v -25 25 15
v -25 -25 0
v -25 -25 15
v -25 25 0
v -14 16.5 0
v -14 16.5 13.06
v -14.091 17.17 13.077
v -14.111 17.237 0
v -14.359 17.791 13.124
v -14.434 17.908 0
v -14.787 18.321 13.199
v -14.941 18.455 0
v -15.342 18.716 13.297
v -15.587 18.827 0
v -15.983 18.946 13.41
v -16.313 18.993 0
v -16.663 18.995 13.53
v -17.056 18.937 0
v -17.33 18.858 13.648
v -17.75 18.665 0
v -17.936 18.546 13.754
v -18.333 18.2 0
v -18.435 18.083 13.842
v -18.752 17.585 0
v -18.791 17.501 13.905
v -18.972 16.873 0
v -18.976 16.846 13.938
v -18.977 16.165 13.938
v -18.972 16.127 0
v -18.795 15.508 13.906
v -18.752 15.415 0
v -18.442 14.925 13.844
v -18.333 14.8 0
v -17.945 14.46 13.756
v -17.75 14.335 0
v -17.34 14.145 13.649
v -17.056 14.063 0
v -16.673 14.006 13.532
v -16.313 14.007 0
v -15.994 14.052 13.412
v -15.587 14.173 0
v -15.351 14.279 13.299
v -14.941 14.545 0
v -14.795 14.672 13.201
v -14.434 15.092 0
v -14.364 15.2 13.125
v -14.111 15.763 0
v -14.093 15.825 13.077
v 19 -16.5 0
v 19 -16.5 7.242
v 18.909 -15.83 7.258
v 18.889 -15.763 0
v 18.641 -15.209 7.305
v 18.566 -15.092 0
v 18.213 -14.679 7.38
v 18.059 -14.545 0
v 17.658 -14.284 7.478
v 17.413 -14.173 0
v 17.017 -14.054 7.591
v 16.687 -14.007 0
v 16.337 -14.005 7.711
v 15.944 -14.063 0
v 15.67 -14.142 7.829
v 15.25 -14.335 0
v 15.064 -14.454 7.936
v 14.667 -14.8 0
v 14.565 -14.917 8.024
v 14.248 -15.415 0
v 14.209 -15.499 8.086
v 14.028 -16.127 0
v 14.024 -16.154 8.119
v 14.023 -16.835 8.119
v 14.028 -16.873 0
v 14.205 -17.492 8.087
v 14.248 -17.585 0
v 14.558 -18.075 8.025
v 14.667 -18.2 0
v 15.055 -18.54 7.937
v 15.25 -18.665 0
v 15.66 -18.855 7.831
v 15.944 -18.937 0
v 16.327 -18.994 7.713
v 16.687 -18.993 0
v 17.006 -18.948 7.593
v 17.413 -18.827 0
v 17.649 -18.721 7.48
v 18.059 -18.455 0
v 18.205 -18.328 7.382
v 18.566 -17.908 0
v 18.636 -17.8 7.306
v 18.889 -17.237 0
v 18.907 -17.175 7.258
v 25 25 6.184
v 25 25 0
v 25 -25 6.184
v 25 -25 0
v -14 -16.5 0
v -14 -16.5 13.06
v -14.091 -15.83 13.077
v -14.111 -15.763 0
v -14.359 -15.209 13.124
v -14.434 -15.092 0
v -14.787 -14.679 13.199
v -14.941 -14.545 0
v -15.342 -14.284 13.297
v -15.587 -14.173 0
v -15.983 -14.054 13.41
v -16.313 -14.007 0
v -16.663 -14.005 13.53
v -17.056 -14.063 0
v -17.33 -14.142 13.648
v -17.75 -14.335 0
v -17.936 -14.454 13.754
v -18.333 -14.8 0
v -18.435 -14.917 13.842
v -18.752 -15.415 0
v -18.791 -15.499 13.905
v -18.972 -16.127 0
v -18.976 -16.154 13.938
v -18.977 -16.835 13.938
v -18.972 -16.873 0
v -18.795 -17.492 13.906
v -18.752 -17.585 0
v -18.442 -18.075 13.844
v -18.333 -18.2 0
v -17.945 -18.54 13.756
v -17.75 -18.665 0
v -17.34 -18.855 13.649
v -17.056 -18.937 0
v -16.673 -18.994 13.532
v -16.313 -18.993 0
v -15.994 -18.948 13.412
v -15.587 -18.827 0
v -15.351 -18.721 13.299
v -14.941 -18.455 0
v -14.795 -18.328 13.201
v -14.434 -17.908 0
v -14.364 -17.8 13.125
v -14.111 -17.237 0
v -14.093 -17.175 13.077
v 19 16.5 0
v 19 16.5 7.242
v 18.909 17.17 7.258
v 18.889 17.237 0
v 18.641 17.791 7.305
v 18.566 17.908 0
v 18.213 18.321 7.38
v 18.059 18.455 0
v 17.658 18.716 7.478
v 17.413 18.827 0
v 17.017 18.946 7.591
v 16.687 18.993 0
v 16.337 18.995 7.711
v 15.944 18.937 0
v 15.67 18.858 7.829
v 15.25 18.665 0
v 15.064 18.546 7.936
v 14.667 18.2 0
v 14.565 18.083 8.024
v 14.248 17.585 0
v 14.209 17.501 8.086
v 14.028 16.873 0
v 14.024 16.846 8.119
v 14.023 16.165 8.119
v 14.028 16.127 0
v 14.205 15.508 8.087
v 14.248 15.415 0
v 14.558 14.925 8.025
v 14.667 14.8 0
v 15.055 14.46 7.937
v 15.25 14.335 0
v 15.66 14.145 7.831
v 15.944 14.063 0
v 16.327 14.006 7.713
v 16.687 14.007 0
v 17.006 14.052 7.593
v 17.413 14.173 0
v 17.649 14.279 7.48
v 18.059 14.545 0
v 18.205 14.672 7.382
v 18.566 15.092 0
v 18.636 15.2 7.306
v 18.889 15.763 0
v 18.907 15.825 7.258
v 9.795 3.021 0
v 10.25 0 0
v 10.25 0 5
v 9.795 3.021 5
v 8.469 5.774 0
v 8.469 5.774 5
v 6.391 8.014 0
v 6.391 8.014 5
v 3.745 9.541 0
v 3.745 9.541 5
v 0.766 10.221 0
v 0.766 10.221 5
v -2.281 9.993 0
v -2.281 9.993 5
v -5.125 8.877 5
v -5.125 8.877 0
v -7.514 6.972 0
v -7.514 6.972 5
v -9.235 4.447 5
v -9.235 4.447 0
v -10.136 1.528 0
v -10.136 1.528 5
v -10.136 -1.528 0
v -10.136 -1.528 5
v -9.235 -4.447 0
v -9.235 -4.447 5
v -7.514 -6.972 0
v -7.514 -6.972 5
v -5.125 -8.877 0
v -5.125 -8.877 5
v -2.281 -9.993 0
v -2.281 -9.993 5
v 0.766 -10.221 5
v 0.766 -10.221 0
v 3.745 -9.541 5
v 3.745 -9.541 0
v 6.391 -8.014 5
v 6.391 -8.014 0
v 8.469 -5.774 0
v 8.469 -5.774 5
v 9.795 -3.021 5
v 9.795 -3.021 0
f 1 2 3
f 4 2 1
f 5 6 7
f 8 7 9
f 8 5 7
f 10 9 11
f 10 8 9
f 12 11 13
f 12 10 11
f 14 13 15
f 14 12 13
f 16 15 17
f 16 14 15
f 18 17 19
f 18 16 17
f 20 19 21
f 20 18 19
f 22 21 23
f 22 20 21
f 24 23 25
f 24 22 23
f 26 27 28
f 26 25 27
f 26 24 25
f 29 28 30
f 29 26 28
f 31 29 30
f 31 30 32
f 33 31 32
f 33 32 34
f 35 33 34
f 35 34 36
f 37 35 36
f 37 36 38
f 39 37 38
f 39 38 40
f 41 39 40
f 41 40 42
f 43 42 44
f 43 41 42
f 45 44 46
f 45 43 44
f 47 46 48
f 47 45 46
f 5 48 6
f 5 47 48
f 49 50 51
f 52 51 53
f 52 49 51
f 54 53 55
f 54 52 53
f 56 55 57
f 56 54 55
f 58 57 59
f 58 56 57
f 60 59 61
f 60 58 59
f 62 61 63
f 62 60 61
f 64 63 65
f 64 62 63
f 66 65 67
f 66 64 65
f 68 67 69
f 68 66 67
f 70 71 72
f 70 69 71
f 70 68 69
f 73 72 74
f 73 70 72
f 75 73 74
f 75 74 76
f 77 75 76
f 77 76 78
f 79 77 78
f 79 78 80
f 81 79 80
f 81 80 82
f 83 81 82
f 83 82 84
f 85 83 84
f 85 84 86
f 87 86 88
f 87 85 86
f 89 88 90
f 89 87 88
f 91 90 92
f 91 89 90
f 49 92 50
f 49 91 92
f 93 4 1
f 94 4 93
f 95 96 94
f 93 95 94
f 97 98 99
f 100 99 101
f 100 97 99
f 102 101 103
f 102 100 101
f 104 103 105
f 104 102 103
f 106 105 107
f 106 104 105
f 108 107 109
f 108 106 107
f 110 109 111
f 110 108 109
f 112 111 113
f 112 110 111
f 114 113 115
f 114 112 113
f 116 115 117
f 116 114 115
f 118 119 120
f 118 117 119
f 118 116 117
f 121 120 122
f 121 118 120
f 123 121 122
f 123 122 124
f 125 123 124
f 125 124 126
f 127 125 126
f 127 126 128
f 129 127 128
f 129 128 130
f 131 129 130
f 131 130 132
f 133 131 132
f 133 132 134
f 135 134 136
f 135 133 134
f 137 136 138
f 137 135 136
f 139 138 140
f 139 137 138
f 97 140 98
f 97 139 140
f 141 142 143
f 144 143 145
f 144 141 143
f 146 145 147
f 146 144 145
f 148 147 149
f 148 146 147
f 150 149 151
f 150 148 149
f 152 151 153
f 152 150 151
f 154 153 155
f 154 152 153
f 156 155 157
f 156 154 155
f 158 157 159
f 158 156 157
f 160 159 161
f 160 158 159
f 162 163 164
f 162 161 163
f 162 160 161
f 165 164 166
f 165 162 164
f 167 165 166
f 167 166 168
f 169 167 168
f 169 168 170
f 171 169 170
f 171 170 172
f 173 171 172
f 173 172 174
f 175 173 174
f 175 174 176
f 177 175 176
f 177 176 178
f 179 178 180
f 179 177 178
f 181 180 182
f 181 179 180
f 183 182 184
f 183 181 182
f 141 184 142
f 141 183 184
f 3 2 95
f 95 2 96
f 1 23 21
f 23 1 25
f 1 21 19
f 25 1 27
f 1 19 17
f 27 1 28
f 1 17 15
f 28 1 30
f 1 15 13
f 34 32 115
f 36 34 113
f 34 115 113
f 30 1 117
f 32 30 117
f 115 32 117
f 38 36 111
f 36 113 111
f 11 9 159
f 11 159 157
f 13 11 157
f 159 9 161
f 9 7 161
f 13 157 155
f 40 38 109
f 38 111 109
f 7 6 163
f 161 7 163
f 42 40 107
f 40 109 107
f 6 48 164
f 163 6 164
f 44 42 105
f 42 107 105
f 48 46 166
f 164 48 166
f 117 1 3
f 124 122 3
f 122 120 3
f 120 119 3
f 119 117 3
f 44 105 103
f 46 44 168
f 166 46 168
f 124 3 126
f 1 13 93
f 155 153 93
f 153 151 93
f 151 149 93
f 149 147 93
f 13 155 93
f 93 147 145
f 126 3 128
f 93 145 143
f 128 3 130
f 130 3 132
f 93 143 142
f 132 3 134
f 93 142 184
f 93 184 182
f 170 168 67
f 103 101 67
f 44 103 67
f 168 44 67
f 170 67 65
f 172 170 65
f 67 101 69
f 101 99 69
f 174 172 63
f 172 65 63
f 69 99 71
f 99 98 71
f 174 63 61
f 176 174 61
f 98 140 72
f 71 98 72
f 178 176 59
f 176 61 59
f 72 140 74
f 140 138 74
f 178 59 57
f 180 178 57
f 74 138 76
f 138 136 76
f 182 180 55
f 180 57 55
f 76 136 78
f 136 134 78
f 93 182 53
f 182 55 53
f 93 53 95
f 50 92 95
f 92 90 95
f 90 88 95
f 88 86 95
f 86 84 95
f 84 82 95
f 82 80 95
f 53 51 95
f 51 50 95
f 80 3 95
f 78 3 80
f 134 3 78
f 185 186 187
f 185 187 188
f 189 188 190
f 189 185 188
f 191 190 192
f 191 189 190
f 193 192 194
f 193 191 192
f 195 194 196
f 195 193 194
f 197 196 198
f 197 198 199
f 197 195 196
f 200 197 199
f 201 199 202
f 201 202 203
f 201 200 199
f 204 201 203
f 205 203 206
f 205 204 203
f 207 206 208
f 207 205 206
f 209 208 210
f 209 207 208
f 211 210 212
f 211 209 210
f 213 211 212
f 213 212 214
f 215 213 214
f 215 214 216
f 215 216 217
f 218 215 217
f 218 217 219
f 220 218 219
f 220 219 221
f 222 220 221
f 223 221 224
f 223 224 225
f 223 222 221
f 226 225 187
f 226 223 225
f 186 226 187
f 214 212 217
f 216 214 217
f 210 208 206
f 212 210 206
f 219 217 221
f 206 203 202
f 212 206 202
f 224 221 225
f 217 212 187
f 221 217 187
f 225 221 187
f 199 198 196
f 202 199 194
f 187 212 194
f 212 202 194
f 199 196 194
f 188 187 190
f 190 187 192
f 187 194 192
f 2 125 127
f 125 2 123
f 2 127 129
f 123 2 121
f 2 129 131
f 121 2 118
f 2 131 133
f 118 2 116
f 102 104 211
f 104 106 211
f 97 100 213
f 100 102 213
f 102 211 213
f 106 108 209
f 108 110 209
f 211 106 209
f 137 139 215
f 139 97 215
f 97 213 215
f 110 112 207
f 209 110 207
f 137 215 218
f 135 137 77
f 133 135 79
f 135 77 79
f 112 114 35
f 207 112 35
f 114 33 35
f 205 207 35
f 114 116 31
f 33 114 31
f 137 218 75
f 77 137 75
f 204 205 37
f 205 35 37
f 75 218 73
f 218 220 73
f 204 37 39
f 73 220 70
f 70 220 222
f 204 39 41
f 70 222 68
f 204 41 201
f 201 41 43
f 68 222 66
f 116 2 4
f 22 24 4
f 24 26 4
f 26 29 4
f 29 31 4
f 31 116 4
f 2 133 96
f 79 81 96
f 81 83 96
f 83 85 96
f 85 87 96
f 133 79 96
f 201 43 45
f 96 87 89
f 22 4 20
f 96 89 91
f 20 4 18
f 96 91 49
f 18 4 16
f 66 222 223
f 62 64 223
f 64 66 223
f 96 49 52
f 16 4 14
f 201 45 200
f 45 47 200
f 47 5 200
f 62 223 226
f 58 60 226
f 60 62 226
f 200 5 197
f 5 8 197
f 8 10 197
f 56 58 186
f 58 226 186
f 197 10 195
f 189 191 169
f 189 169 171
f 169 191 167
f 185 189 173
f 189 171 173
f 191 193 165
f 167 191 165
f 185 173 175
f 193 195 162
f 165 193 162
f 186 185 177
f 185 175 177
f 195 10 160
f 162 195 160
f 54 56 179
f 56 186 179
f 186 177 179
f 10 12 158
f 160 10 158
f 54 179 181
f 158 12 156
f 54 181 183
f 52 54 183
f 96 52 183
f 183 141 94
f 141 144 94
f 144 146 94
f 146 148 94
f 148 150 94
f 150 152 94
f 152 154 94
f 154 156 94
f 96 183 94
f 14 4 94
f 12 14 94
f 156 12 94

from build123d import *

# Parameters (mm, degrees)
F0_W     = 50
F0_H     = 50
F0_R     = 2.5
F0_R_2   = 9.55
F1_DEPTH = 15
F3_DEPTH = 25
F4_R     = 10.25
F5_DEPTH = 5


with BuildPart() as f1:
    # F0 (on Top) → F1 (new body)
    with BuildSketch(Plane.XY):
        Rectangle(F0_W, F0_H)
        with Locations((-16.5, -16.5)):
            Circle(F0_R, mode=Mode.SUBTRACT)
        with Locations((16.5, -16.5)):
            Circle(F0_R, mode=Mode.SUBTRACT)
        with Locations((-16.5, 16.5)):
            Circle(F0_R, mode=Mode.SUBTRACT)
        Circle(F0_R_2, mode=Mode.SUBTRACT)
        with Locations((16.5, 16.5)):
            Circle(F0_R, mode=Mode.SUBTRACT)
        Circle(F0_R_2)
    extrude(amount=F1_DEPTH)

    # F2 (on Front) → F3 (cut, symmetric)
    with BuildSketch(Plane.XZ):
        Polygon((25, 15), (-25, 15), (25, 6.183651), align=None)
    extrude(amount=F3_DEPTH, both=True, mode=Mode.SUBTRACT)

    # F4 (on Top) → F5 (cut)
    with BuildSketch(Plane.XY):
        Circle(F4_R)
    extrude(amount=F5_DEPTH, mode=Mode.SUBTRACT)


solid = f1.part
